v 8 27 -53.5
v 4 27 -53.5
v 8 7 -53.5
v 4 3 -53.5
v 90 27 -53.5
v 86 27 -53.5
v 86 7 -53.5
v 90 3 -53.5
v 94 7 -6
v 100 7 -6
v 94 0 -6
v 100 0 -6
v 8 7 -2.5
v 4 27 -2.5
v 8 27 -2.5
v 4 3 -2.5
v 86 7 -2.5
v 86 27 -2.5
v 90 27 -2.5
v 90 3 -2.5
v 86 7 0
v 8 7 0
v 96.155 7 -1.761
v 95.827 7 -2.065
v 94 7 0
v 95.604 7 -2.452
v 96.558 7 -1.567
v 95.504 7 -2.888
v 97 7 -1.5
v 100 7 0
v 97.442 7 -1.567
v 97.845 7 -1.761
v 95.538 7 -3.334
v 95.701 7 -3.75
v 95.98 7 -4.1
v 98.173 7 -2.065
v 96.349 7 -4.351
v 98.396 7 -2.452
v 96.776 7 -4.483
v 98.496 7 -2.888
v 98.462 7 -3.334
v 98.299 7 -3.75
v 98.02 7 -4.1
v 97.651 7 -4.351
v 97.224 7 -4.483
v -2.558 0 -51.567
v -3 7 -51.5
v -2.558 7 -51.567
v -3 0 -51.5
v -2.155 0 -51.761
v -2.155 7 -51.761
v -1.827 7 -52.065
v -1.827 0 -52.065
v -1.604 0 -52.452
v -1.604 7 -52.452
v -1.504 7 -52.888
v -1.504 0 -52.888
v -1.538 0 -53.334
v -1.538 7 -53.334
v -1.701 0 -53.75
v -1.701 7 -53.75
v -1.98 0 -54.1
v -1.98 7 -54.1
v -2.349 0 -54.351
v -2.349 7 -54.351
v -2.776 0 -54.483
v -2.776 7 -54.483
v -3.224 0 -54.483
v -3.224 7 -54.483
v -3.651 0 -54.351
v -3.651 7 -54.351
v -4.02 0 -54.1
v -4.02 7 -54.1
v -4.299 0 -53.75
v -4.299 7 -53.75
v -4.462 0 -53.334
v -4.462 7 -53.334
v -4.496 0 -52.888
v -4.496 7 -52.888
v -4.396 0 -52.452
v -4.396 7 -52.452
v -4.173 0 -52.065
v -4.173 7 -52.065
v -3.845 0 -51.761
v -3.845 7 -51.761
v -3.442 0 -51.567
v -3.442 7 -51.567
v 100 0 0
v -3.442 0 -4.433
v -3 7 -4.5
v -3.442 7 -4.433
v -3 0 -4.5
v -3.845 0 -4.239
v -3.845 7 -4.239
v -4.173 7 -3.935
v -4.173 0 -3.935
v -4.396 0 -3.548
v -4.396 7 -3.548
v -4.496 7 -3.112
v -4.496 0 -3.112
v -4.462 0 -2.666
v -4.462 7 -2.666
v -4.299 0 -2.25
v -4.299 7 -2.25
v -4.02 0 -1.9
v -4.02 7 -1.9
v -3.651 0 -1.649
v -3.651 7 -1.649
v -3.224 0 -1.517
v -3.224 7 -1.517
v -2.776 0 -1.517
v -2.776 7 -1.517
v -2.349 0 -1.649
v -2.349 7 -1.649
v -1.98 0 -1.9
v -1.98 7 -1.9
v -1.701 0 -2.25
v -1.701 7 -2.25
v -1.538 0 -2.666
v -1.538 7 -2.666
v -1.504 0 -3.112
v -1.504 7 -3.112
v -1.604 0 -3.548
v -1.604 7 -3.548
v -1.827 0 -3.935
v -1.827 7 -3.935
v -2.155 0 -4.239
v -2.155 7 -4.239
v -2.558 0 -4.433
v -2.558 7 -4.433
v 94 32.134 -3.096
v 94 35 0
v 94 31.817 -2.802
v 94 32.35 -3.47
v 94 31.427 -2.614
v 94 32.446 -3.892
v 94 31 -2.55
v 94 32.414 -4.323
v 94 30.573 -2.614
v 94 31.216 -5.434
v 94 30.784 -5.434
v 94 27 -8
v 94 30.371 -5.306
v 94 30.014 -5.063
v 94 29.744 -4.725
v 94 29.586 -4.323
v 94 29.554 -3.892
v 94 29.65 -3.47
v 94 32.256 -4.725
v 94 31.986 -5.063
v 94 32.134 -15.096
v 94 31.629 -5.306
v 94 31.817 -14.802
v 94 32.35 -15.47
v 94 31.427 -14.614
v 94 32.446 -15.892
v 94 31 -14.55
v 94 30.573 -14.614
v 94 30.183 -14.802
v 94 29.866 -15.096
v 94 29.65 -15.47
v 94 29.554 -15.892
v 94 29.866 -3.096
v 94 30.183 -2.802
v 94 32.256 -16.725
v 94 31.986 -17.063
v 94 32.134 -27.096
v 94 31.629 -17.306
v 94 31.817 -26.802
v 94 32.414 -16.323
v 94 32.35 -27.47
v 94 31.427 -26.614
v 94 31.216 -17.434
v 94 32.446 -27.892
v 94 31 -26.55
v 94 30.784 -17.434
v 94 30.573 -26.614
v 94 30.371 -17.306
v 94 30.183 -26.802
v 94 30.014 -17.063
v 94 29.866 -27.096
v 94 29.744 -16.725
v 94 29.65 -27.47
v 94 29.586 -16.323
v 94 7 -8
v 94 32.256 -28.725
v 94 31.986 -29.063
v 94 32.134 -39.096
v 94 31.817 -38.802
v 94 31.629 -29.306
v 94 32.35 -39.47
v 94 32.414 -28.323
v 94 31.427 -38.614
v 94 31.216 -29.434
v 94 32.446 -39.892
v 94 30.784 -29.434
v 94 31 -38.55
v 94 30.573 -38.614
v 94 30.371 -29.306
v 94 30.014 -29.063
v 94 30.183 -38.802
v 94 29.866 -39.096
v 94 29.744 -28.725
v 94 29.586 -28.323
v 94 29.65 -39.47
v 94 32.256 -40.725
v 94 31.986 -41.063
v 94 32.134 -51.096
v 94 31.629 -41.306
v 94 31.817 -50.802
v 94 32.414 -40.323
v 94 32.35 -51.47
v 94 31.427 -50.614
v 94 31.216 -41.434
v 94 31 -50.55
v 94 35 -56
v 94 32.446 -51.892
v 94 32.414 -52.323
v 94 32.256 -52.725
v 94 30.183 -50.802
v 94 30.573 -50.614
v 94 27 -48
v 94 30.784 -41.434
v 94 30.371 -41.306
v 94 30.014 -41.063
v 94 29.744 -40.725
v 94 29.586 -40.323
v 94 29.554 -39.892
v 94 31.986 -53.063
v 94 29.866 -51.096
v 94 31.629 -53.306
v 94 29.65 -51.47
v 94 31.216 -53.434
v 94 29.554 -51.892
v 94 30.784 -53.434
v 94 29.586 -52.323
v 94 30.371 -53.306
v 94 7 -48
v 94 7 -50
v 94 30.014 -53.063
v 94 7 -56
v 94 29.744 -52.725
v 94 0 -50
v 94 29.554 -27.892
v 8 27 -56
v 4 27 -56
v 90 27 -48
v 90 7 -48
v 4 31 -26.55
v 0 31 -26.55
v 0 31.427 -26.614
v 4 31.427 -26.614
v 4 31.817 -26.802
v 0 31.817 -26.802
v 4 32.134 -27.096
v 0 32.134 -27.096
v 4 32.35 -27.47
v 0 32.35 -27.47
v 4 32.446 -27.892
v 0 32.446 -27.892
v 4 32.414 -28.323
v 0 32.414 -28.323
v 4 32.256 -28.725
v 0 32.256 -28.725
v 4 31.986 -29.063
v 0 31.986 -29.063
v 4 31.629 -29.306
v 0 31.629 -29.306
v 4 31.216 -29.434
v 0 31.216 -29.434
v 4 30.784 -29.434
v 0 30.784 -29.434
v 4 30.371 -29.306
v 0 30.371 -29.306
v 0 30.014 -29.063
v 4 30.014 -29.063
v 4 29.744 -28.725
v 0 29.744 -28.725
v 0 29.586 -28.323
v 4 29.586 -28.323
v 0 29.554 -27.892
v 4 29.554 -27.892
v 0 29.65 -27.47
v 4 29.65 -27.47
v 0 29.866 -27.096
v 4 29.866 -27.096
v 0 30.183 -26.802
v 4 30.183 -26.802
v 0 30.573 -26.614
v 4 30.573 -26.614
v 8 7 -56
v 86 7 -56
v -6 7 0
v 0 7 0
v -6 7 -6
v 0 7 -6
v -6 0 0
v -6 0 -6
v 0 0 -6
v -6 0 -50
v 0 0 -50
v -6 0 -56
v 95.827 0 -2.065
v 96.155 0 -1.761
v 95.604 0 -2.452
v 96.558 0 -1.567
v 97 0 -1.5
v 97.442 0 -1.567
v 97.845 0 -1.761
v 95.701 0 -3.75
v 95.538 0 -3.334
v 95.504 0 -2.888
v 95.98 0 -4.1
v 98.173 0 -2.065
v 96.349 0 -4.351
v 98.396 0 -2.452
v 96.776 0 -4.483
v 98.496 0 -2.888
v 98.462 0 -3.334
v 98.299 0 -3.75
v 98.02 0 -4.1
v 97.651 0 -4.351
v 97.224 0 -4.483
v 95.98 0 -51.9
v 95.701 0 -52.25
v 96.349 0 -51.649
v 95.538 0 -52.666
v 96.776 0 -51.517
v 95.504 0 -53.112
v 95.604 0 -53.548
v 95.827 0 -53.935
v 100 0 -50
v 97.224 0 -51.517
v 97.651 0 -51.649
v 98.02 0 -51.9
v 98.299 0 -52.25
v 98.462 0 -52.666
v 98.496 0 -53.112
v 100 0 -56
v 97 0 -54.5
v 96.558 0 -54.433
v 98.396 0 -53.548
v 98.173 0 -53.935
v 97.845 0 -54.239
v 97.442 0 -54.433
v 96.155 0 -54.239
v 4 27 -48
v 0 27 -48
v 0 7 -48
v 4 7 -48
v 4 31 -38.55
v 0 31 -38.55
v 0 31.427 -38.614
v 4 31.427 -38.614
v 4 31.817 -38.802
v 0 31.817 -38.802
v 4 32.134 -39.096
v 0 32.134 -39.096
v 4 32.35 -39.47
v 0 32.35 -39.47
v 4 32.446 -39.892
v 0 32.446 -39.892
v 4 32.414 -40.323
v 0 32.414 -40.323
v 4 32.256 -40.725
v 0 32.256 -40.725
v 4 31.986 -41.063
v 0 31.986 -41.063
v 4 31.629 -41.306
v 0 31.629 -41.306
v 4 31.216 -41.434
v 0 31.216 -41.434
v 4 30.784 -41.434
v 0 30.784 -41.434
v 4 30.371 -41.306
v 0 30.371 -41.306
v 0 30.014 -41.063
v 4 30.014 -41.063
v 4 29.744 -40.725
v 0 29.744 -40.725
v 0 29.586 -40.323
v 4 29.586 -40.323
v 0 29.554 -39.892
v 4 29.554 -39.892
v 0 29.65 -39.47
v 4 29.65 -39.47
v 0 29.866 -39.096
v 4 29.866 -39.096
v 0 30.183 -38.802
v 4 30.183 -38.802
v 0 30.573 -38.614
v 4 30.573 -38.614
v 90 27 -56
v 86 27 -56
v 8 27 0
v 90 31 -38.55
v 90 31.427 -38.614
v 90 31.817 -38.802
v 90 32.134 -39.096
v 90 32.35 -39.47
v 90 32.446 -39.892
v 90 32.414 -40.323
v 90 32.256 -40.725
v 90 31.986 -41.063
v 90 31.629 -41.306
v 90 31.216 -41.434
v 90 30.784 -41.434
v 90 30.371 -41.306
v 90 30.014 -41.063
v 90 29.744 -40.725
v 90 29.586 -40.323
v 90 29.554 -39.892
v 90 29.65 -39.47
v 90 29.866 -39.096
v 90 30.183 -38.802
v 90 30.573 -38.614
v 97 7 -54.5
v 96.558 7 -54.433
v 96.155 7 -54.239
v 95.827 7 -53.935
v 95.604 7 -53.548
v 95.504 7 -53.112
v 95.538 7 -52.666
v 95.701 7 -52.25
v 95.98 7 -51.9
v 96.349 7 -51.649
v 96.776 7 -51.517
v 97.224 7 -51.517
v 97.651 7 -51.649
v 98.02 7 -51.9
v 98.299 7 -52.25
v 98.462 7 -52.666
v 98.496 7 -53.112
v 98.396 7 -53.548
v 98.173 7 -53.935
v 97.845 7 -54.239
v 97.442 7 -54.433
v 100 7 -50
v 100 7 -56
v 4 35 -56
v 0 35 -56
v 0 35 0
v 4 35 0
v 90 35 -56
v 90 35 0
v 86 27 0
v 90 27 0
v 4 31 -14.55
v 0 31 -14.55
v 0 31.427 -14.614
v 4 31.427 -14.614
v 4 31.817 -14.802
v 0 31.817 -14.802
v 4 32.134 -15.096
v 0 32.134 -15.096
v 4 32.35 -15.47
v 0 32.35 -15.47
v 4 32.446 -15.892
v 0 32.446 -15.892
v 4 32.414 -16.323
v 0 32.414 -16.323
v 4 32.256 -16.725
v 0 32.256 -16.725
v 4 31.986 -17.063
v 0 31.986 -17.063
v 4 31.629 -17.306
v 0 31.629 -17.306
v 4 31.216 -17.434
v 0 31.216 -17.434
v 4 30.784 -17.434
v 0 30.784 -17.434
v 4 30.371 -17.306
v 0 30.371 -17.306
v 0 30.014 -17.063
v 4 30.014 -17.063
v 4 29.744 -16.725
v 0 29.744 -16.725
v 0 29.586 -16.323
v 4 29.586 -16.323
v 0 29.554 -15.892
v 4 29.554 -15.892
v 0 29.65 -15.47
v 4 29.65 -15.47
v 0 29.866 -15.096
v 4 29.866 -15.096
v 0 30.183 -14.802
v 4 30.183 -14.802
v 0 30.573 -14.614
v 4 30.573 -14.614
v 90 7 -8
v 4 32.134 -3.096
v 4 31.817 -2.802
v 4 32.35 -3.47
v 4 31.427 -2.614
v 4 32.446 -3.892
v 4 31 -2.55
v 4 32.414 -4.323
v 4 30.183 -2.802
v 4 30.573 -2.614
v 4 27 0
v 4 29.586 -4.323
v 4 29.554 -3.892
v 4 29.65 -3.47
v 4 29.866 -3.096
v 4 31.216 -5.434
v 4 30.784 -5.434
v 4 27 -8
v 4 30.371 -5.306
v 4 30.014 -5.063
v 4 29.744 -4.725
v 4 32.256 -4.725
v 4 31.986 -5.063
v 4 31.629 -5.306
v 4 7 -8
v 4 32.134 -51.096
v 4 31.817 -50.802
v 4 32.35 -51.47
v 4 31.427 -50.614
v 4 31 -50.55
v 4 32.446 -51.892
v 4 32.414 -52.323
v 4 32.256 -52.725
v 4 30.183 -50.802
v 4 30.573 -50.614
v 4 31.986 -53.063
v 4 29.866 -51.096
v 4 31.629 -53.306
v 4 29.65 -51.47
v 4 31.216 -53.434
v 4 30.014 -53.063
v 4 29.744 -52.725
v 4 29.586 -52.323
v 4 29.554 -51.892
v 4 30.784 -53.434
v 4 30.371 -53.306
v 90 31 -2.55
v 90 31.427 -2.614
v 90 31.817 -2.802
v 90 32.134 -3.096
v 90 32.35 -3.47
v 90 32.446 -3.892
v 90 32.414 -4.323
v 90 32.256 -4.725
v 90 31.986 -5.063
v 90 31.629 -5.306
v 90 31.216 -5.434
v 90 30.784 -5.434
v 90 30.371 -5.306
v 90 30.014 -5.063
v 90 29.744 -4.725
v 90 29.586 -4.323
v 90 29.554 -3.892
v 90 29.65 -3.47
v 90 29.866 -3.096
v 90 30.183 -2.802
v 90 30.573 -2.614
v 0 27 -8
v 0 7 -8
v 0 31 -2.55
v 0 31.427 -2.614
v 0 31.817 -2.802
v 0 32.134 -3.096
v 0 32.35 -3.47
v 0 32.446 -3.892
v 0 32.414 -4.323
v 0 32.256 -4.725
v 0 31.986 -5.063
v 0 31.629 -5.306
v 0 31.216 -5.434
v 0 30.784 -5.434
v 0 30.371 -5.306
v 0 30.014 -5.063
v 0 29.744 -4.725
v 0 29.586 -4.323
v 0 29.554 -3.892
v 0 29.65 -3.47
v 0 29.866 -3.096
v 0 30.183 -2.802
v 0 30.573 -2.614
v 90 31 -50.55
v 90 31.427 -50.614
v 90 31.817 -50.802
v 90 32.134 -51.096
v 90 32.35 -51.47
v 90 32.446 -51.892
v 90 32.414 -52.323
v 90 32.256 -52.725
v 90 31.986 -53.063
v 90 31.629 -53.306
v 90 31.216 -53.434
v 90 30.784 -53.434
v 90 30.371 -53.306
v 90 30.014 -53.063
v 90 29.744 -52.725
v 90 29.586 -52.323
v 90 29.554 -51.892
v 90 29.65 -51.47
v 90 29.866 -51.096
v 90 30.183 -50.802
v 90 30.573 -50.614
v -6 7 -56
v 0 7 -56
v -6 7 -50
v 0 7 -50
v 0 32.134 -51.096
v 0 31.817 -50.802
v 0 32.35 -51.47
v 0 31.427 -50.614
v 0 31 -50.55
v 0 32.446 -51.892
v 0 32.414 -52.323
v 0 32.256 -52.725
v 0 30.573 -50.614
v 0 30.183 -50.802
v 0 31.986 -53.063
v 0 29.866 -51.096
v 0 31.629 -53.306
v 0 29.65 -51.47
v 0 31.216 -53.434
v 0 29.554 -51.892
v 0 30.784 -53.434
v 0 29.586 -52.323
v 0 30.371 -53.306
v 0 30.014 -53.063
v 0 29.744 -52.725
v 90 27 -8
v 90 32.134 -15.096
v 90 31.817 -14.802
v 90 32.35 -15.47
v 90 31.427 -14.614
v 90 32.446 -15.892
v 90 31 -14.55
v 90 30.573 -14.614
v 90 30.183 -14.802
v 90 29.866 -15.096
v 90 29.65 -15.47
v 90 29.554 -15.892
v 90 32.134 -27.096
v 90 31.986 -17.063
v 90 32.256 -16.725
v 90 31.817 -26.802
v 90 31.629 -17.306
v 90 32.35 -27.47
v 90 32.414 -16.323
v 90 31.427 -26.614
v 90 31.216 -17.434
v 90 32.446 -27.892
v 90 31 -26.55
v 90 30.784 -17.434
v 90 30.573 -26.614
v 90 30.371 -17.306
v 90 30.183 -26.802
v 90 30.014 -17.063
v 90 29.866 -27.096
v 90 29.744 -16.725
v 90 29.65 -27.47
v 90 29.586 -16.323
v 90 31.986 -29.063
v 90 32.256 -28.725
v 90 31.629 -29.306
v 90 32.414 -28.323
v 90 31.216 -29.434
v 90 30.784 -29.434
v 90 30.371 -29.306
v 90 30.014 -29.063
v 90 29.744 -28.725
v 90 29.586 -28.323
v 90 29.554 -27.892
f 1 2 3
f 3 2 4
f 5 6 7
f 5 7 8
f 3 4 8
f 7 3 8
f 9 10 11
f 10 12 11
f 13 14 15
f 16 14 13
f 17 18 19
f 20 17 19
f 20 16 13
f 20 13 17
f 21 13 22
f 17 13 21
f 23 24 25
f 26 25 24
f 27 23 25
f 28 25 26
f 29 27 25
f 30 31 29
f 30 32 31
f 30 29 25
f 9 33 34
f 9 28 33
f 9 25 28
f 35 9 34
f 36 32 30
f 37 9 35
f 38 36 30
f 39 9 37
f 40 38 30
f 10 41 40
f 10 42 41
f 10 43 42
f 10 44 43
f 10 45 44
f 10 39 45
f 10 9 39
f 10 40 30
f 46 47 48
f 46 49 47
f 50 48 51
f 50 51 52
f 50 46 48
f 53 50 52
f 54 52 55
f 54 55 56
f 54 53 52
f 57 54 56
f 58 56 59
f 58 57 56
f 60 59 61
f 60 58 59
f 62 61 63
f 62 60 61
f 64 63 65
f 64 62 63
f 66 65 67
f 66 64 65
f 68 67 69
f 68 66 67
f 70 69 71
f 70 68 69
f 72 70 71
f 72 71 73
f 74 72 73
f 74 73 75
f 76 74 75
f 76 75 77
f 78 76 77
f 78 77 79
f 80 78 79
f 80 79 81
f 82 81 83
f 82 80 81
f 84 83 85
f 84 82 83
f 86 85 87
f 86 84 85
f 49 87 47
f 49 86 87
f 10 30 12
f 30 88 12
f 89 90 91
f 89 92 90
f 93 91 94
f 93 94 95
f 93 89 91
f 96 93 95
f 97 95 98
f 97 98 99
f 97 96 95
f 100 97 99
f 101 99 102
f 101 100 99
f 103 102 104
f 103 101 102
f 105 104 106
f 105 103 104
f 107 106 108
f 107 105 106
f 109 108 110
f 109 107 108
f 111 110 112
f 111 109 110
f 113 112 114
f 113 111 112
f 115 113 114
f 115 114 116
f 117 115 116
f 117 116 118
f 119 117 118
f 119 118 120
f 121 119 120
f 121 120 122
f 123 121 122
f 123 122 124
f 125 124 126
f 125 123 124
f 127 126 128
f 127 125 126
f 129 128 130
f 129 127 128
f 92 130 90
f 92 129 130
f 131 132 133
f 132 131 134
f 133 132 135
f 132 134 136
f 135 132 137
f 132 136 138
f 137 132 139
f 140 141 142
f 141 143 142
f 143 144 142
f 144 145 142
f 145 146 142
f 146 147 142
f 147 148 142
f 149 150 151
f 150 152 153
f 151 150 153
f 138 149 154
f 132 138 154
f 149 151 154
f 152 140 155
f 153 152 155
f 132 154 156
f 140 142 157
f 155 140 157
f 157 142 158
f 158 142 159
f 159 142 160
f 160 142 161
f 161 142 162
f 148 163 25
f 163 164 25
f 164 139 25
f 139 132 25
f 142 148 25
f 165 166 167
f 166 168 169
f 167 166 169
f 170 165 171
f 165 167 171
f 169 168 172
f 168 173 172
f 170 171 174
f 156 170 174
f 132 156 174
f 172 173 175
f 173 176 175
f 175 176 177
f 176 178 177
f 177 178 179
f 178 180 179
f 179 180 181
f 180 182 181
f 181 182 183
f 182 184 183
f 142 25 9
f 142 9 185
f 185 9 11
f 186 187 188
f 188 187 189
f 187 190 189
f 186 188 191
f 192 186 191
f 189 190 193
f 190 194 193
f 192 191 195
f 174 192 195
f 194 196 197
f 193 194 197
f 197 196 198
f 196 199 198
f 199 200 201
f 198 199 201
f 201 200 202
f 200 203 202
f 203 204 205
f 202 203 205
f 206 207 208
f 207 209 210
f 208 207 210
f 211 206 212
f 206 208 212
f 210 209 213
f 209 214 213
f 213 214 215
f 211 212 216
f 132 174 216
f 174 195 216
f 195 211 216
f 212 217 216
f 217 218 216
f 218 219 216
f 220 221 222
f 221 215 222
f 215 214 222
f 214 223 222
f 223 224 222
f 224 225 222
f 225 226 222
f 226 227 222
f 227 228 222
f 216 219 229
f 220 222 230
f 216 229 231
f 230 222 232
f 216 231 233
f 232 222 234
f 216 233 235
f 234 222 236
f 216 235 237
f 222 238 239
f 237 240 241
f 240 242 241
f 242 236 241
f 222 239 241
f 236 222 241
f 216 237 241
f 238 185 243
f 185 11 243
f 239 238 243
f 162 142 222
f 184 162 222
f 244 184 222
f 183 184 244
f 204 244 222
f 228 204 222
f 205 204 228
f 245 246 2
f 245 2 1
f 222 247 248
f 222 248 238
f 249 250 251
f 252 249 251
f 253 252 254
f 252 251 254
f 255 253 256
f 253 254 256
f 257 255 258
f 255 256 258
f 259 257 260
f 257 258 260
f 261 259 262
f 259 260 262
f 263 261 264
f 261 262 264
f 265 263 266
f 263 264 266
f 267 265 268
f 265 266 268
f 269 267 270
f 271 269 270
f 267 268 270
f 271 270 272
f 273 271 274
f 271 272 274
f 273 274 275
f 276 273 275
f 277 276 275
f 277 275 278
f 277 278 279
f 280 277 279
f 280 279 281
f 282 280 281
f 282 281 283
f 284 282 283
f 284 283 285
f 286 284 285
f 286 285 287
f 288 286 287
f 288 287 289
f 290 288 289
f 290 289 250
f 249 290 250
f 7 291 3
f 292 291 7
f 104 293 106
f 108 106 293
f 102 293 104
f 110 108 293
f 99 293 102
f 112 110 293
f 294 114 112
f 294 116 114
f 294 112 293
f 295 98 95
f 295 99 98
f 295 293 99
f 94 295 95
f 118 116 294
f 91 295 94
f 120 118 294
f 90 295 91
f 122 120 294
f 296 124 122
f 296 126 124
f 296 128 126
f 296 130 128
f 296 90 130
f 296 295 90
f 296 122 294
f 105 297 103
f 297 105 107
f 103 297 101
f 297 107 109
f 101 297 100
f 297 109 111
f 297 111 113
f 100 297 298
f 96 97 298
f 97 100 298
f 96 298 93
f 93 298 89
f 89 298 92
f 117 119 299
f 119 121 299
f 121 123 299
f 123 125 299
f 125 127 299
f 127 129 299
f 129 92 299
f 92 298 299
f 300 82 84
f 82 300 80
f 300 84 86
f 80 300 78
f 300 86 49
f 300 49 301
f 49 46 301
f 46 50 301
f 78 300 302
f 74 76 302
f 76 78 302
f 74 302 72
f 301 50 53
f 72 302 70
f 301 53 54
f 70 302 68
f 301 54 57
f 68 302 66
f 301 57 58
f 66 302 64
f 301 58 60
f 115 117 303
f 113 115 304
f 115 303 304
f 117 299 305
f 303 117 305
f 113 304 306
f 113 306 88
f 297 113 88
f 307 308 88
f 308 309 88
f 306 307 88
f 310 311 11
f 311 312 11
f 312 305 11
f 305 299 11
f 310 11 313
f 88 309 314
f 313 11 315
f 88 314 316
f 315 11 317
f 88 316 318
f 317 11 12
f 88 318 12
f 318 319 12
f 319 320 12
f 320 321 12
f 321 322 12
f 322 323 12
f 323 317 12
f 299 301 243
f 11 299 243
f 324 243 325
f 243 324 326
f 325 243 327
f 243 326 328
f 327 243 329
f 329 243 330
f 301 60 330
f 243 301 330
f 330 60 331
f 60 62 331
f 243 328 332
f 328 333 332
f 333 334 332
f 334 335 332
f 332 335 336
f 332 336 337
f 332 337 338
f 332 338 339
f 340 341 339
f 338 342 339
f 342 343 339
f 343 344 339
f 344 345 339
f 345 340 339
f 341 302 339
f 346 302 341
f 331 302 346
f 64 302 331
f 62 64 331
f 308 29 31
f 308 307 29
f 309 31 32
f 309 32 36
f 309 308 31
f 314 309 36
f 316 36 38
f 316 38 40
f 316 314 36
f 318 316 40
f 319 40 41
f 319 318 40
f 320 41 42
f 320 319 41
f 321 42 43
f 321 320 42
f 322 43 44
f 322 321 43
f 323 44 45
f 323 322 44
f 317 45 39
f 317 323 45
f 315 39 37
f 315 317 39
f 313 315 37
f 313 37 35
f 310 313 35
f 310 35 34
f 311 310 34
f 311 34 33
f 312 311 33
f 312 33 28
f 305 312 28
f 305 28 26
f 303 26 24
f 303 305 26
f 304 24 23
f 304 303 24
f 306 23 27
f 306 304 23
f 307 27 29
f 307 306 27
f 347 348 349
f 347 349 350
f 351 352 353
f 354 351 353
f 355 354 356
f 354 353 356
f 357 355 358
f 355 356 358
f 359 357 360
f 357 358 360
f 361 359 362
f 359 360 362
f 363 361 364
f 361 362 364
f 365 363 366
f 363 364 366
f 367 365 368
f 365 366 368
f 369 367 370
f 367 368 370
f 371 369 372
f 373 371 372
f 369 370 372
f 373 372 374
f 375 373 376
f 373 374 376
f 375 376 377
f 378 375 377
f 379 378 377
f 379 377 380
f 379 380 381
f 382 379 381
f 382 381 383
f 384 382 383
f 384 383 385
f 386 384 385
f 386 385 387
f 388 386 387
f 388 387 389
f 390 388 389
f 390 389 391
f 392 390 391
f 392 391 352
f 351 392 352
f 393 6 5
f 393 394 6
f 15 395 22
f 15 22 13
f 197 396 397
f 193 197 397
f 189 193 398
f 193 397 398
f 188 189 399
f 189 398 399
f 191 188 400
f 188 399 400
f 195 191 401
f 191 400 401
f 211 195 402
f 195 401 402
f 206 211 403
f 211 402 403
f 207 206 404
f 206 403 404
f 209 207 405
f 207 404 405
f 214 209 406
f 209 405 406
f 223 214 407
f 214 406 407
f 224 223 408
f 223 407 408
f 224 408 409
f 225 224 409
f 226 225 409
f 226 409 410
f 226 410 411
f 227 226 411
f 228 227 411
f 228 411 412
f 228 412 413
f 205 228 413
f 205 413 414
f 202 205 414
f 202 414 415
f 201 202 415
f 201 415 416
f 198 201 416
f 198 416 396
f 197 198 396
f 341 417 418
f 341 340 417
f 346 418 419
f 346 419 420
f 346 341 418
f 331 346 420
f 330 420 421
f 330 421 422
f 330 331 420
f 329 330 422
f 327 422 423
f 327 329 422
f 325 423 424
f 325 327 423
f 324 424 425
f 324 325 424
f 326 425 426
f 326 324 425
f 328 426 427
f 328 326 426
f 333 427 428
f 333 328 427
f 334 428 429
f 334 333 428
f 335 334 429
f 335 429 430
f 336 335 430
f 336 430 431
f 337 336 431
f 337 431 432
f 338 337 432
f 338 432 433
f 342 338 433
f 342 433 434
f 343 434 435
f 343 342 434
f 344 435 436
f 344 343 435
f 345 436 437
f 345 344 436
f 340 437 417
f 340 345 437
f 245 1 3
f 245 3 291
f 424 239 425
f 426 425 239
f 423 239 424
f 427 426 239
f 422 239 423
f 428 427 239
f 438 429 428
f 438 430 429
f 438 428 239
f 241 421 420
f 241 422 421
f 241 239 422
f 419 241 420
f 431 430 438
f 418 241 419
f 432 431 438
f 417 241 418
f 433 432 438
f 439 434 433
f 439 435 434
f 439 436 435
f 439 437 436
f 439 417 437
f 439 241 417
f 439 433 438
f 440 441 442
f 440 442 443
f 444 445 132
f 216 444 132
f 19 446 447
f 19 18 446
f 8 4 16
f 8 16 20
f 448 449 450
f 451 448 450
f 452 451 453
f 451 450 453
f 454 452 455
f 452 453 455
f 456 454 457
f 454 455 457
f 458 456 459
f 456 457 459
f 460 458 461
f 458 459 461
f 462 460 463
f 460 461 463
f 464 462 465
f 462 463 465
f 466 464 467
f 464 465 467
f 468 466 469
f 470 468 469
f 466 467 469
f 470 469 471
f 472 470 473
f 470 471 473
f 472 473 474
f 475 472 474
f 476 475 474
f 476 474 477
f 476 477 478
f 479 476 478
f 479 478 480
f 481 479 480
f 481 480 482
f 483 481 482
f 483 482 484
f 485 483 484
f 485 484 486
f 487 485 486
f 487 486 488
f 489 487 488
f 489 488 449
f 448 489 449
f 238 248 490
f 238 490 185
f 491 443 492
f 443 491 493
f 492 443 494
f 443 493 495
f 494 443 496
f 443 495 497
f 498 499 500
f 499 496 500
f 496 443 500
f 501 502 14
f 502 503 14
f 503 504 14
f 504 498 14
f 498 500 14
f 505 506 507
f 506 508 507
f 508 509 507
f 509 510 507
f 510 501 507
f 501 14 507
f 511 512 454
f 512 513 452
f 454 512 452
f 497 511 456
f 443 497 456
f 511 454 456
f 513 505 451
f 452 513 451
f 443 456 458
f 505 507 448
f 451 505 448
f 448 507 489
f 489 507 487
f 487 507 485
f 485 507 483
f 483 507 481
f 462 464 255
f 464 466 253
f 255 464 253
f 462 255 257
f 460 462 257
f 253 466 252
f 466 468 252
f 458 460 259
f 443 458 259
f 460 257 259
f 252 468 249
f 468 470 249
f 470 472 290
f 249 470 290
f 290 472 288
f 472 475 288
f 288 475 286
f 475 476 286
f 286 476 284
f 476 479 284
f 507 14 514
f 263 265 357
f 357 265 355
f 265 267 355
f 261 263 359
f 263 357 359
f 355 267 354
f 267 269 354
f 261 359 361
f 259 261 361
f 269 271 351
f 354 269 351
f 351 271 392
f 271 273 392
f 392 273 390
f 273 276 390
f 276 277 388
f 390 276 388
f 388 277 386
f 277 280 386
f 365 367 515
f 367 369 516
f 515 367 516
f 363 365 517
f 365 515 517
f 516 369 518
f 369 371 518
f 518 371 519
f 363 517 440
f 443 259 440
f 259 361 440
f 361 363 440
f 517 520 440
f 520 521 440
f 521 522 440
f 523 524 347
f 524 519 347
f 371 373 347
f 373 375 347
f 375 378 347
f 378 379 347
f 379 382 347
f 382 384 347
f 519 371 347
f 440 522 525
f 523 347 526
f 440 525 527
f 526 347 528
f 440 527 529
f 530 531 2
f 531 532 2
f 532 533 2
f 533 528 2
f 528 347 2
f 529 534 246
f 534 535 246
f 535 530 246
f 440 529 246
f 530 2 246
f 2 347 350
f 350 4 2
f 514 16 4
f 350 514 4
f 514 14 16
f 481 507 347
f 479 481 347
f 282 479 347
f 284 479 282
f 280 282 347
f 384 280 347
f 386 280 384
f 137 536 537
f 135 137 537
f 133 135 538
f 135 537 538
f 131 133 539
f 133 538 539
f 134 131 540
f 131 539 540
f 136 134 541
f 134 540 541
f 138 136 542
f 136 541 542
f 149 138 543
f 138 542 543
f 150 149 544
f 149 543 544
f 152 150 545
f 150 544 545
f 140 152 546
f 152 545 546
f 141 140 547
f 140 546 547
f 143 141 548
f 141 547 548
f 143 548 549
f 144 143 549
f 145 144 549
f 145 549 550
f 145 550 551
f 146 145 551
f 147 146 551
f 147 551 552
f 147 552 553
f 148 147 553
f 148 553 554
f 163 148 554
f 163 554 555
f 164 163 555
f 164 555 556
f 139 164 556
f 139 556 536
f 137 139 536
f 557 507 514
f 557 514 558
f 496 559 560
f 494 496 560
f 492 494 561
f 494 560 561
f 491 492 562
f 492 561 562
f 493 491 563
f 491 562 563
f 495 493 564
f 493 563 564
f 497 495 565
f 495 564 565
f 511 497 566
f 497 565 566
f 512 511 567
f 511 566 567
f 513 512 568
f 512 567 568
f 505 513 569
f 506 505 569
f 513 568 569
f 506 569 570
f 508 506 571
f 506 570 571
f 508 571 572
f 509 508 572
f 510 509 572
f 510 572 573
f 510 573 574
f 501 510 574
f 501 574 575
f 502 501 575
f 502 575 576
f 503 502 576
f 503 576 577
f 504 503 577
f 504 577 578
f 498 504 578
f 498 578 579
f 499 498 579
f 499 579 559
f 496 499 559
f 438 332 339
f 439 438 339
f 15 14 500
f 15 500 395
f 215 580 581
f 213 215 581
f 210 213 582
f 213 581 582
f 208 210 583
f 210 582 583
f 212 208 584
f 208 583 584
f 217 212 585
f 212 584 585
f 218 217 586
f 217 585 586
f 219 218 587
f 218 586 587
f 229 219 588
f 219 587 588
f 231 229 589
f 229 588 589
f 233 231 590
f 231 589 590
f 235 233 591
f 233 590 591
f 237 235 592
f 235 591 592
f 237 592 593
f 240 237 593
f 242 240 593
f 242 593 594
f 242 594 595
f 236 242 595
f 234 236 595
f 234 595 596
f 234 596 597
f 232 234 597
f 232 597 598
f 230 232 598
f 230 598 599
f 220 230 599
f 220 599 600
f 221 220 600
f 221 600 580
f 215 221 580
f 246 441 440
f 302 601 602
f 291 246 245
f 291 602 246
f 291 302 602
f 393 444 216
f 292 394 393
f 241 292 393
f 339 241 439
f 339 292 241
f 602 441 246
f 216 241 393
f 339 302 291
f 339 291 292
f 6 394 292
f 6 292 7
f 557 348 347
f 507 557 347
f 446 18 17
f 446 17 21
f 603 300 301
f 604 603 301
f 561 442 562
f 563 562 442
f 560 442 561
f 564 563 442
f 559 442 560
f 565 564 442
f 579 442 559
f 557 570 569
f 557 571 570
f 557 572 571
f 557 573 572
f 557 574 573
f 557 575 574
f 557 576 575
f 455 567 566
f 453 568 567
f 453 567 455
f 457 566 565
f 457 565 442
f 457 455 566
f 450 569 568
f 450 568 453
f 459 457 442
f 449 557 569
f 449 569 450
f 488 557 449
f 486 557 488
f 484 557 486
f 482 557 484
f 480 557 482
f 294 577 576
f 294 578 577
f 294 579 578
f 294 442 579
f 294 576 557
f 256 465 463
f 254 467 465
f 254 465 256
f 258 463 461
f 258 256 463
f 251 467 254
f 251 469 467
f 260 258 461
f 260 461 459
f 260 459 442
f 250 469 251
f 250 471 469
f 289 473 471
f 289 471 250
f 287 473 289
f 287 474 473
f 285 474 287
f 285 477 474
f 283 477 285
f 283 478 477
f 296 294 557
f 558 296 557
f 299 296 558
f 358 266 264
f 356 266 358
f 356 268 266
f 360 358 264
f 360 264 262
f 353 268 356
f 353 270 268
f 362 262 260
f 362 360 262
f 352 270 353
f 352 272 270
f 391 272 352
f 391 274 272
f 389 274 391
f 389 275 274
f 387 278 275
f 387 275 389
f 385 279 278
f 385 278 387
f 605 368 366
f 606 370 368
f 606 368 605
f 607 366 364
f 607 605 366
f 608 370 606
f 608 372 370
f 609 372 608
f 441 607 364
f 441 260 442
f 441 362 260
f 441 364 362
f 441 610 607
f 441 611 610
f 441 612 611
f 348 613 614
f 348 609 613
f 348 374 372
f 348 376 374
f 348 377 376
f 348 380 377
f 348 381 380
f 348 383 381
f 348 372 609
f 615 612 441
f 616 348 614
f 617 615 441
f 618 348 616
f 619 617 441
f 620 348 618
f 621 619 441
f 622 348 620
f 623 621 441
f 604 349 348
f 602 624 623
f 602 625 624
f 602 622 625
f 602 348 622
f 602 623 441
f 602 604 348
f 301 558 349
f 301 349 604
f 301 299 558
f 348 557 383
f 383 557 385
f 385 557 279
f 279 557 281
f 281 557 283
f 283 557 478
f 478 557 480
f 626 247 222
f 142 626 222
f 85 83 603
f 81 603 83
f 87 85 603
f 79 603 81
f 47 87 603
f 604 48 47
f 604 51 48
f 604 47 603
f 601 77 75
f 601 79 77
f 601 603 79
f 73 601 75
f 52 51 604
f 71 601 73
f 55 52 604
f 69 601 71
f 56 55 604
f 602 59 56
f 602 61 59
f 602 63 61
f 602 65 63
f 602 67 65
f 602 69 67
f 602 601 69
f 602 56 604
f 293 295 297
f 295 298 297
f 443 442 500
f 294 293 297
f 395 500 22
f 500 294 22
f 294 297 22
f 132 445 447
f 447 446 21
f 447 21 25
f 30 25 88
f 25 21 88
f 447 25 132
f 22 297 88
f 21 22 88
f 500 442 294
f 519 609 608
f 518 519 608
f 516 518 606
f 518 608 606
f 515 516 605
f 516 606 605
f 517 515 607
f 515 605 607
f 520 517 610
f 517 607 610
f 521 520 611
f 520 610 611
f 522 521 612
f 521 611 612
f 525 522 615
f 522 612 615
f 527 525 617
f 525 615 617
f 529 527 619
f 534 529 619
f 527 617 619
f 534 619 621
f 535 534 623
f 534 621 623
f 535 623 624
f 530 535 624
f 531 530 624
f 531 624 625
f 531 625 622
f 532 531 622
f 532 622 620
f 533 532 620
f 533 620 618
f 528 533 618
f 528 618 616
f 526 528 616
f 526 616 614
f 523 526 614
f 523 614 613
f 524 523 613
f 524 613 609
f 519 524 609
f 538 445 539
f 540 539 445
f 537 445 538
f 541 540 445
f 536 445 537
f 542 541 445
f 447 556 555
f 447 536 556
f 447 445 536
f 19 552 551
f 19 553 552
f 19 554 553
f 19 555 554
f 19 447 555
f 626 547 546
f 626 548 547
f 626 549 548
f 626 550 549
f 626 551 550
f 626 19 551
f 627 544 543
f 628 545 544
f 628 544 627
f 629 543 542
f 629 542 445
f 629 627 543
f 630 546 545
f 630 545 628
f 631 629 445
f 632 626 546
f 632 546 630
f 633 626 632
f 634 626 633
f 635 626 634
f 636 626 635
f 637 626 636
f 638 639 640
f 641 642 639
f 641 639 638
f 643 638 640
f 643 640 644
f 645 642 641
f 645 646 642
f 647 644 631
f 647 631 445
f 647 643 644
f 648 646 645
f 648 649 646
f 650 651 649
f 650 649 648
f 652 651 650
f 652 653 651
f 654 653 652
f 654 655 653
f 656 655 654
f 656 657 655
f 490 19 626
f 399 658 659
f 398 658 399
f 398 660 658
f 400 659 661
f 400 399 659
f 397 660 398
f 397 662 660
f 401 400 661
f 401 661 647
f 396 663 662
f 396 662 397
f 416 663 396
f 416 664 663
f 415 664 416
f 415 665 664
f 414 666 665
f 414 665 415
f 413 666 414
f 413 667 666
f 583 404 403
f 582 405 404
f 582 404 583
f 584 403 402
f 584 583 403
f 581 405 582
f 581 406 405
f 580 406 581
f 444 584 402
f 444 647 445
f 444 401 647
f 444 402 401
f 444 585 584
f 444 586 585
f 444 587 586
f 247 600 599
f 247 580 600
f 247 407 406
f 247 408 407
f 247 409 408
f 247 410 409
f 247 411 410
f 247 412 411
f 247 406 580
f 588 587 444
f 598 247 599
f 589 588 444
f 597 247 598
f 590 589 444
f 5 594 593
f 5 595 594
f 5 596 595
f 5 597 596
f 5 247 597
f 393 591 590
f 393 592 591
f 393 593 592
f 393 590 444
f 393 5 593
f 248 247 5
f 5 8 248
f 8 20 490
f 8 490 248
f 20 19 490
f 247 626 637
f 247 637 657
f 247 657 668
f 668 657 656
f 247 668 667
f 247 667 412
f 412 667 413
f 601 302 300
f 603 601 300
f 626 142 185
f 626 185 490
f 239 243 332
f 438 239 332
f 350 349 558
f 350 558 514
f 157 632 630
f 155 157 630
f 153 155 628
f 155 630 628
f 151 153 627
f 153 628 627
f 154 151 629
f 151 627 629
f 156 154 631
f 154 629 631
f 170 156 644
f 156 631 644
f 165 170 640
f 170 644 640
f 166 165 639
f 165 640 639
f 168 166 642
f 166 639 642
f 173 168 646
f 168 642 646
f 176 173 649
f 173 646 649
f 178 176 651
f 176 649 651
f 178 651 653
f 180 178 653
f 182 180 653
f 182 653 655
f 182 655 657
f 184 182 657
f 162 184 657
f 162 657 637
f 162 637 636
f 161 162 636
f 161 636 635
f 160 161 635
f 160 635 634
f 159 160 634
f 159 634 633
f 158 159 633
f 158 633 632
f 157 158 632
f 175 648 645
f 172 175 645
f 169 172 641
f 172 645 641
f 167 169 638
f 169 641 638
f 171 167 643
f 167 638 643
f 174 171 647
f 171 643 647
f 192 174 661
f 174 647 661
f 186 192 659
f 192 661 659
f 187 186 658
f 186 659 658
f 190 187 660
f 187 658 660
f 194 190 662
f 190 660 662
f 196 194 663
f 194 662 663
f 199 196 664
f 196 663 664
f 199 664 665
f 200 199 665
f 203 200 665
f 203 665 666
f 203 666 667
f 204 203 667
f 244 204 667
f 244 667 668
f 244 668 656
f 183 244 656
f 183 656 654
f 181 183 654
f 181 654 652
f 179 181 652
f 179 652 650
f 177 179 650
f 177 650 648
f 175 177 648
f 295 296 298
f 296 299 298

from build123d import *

# Parameters (mm, degrees)
SKETCH1_R           = 1.5
BOSS_EXTRUDE1_DEPTH = 3
SKETCH2_R           = 1.5
SKETCH2_W           = 86
SKETCH2_H           = 51
BOSS_EXTRUDE2_DEPTH = 4
BOSS_EXTRUDE3_DEPTH = 20
SKETCH4_W           = 4
SKETCH4_H           = 56
BOSS_EXTRUDE4_DEPTH = 8
SKETCH5_R           = 1.45
CUT_EXTRUDE1_DEPTH  = 120.837389825


with BuildPart() as part:
    # Sketch1 → Boss-Extrude1 (new body)
    with BuildSketch(Plane(origin=(0, 0, 0), x_dir=(1, 0, 0), z_dir=(0, 1, 0))):
        Polygon((0, 0), (94, 0), (100, 0), (100, 6), (94, 6), (94, 50), (100, 50), (100, 56), (94, 56), (0, 56), (-6, 56), (-6, 50), (0, 50), (0, 6), (-6, 6), (-6, 0), align=None)
        with Locations(Location((-3, 53, 0), (0, 0, 270))):
            Circle(SKETCH1_R, mode=Mode.SUBTRACT)
        with Locations(Location((97, 53, 0), (0, 0, 90))):
            Circle(SKETCH1_R, mode=Mode.SUBTRACT)
        with Locations(Location((97, 3, 0), (0, 0, 270))):
            Circle(SKETCH1_R, mode=Mode.SUBTRACT)
        with Locations(Location((-3, 3, 0), (0, 0, 90))):
            Circle(SKETCH1_R, mode=Mode.SUBTRACT)
    extrude(amount=BOSS_EXTRUDE1_DEPTH)

    # Sketch2 → Boss-Extrude2 (add)
    with BuildSketch(Plane(origin=(0, 3, 0), x_dir=(1, 0, 0), z_dir=(0, 1, 0))):
        Polygon((0, 50), (0, 6), (-6, 6), (-6, 0), (100, 0), (100, 6), (94, 6), (94, 50), (100, 50), (100, 56), (-6, 56), (-6, 50), align=None)
        with Locations(Location((-3, 53, 0), (0, 0, 270))):
            Circle(SKETCH2_R, mode=Mode.SUBTRACT)
        with Locations(Location((97, 53, 0), (0, 0, 90))):
            Circle(SKETCH2_R, mode=Mode.SUBTRACT)
        with Locations(Location((97, 3, 0), (0, 0, 270))):
            Circle(SKETCH2_R, mode=Mode.SUBTRACT)
        with Locations(Location((-3, 3, 0), (0, 0, 90))):
            Circle(SKETCH2_R, mode=Mode.SUBTRACT)
        with Locations((47, 28)):
            Rectangle(SKETCH2_W, SKETCH2_H, mode=Mode.SUBTRACT)
    extrude(amount=BOSS_EXTRUDE2_DEPTH)

    # Sketch3 → Boss-Extrude3 (add)
    with BuildSketch(Plane(origin=(0, 7, 0), x_dir=(1, 0, 0), z_dir=(0, 1, 0))):
        Polygon((8, 56), (0, 56), (0, 48), (4, 48), (4, 53.5), (8, 53.5), align=None)
        Polygon((90, 48), (94, 48), (94, 56), (86, 56), (86, 53.5), (90, 53.5), align=None)
        Polygon((94, 0), (94, 8), (90, 8), (90, 2.5), (86, 2.5), (86, 0), align=None)
        Polygon((4, 8), (0, 8), (0, 0), (8, 0), (8, 2.5), (4, 2.5), align=None)
    extrude(amount=BOSS_EXTRUDE3_DEPTH)

    # Sketch4 → Boss-Extrude4 (add)
    with BuildSketch(Plane(origin=(0, 27, 0), x_dir=(1, 0, 0), z_dir=(0, 1, 0))):
        with Locations((2, 28)):
            Rectangle(SKETCH4_W, SKETCH4_H)
        with Locations((92, 28)):
            Rectangle(SKETCH4_W, SKETCH4_H)
    extrude(amount=BOSS_EXTRUDE4_DEPTH)

    # Sketch5 → Cut-Extrude1 (cut, through all)
    with BuildSketch(Plane.ZY):
        with Locations((-52, 31)):
            Circle(SKETCH5_R)
        with Locations((-40, 31)):
            Circle(SKETCH5_R)
        with Locations((-28, 31)):
            Circle(SKETCH5_R)
        with Locations((-16, 31)):
            Circle(SKETCH5_R)
        with Locations((-4, 31)):
            Circle(SKETCH5_R)
    extrude(amount=-CUT_EXTRUDE1_DEPTH, mode=Mode.SUBTRACT)


solid = part.part
